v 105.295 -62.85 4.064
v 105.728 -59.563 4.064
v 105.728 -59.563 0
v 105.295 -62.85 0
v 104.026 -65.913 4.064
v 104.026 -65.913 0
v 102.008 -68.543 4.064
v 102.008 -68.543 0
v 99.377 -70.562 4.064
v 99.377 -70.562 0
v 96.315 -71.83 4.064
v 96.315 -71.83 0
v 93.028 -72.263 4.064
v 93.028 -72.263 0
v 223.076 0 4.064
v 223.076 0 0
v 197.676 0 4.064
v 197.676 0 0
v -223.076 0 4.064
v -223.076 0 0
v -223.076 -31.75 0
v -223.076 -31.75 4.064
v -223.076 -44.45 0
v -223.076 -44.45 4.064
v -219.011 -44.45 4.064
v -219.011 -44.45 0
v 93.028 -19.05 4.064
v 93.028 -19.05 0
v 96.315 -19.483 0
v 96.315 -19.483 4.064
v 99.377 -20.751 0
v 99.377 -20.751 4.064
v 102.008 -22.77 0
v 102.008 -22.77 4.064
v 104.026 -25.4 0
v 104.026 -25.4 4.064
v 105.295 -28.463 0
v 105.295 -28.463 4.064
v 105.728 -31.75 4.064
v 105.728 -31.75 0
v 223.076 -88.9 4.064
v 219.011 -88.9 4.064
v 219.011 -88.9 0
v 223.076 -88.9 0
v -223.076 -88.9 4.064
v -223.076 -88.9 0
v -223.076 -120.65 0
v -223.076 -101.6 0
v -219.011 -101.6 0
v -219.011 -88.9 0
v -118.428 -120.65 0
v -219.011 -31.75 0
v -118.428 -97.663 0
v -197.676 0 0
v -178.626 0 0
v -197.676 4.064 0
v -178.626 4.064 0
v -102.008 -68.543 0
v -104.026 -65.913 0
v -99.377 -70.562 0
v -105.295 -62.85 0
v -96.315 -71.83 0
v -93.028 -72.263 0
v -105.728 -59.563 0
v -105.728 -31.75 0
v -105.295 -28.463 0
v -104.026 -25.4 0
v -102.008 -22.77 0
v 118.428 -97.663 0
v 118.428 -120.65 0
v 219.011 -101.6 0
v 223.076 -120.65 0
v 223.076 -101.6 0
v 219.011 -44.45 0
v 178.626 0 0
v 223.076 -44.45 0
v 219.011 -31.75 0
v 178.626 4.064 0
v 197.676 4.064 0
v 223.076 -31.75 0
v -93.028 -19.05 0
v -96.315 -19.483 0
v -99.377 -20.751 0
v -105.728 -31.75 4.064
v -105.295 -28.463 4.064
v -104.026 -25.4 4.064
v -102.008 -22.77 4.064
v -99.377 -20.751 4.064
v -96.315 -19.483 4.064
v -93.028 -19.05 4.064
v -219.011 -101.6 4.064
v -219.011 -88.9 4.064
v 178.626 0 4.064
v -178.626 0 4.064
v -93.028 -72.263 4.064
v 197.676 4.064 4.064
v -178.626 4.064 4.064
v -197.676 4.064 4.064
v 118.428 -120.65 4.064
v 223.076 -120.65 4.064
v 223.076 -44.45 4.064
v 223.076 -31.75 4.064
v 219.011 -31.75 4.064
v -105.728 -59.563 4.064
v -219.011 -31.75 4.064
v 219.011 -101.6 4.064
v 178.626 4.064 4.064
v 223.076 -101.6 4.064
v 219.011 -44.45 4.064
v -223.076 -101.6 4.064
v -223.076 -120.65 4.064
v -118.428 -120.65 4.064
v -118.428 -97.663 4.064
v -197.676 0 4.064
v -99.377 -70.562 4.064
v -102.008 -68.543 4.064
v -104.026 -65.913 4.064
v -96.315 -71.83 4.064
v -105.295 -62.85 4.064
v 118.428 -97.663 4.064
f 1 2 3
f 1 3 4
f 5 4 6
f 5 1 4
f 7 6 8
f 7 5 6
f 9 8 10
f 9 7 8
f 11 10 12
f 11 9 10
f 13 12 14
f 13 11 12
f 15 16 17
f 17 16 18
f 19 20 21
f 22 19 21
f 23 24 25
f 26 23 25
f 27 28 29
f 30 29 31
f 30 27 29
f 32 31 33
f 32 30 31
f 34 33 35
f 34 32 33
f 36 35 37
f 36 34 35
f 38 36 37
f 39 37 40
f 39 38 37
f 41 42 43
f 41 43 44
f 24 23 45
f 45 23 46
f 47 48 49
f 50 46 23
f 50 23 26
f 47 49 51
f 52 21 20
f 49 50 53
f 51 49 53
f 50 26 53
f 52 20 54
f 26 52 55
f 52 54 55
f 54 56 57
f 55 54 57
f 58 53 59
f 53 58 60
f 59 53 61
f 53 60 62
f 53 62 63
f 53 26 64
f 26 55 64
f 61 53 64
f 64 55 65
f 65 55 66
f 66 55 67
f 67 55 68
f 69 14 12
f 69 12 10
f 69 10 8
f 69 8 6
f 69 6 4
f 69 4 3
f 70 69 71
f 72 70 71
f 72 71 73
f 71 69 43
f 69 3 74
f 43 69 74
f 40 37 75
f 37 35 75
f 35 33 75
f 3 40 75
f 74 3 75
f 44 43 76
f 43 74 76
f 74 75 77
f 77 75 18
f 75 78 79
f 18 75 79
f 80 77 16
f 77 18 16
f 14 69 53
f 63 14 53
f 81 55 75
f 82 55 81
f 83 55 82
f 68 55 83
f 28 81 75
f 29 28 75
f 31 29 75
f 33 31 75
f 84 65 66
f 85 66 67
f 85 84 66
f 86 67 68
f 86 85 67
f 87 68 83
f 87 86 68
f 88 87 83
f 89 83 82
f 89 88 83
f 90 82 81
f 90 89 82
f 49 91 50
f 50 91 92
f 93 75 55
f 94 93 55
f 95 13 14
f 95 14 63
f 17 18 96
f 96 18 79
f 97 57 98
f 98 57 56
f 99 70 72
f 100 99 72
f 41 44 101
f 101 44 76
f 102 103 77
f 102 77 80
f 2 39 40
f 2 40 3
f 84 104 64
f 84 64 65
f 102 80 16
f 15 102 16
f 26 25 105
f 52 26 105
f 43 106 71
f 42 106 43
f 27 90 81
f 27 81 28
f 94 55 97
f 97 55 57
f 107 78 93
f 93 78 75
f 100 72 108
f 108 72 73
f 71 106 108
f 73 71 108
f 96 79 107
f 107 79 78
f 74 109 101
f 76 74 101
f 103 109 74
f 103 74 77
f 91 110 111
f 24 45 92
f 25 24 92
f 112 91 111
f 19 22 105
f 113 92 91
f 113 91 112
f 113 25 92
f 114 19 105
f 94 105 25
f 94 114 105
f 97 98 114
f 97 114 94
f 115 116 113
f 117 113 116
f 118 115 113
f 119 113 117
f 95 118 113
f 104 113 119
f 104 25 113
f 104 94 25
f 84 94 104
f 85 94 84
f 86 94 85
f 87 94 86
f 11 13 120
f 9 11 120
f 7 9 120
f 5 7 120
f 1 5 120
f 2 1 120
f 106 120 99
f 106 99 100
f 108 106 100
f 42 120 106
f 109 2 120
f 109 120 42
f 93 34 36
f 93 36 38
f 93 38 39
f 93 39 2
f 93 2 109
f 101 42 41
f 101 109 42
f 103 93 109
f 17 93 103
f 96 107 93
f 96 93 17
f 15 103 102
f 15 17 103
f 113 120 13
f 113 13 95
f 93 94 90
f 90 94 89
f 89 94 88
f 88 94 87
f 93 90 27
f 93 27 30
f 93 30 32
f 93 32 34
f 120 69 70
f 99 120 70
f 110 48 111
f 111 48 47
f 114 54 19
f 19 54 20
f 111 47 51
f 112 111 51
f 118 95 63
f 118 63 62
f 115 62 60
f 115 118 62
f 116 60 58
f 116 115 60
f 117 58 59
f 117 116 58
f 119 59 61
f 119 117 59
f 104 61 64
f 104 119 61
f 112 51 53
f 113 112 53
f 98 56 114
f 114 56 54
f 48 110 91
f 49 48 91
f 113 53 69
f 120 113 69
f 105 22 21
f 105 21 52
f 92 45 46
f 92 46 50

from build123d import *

# Parameters (mm, degrees)
BOSS_EXTRUDE1_DEPTH = 4.064
SKETCH2_W           = 4.064
SKETCH2_H           = 12.7
CUT_EXTRUDE1_DEPTH  = 5.064
CUT_EXTRUDE2_DEPTH  = 5.064


with BuildPart() as part:
    # Sketch1 → Boss-Extrude1 (new body)
    with BuildSketch(Plane.XY):
        Polygon((-118.4275, -120.65), (-118.4275, -97.663), (118.4275, -97.663), (118.4275, -120.65), (223.0755, -120.65), (223.0755, 0), (197.6755, 0), (197.6755, 4.064), (178.6255, 4.064), (178.6255, 0), (-178.6255, 0), (-178.6255, 4.064), (-197.6755, 4.064), (-197.6755, 0), (-223.0755, 0), (-223.0755, -120.65), align=None)
    extrude(amount=BOSS_EXTRUDE1_DEPTH)

    # Sketch2 → Cut-Extrude1 (cut, through all)
    with BuildSketch(Plane.XY.offset(4.064)):
        with Locations((-221.0435, -38.1)):
            Rectangle(SKETCH2_W, SKETCH2_H)
        with Locations((-221.0435, -95.25)):
            Rectangle(SKETCH2_W, SKETCH2_H)
        with Locations((221.0435, -95.25)):
            Rectangle(SKETCH2_W, SKETCH2_H)
        with Locations((221.0435, -38.1)):
            Rectangle(SKETCH2_W, SKETCH2_H)
    extrude(amount=-CUT_EXTRUDE1_DEPTH, mode=Mode.SUBTRACT)

    # Sketch3 → Cut-Extrude2 (cut, through all)
    with BuildSketch(Plane.XY.offset(4.064)):
        with BuildLine():
            Line((-93.0275, -19.05), (93.0275, -19.05))
            ThreePointArc((93.0275, -19.05), (102.007756121, -22.769743879), (105.7275, -31.75))
            Line((105.7275, -31.75), (105.7275, -59.563))
            ThreePointArc((105.7275, -59.563), (102.007756121, -68.543256121), (93.0275, -72.263))
            Line((93.0275, -72.263), (-93.0275, -72.263))
            ThreePointArc((-93.0275, -72.263), (-102.007756121, -68.543256121), (-105.7275, -59.563))
            Line((-105.7275, -59.563), (-105.7275, -31.75))
            ThreePointArc((-105.7275, -31.75), (-102.007756121, -22.769743879), (-93.0275, -19.05))
        make_face()
    extrude(amount=-CUT_EXTRUDE2_DEPTH, mode=Mode.SUBTRACT)


solid = part.part
